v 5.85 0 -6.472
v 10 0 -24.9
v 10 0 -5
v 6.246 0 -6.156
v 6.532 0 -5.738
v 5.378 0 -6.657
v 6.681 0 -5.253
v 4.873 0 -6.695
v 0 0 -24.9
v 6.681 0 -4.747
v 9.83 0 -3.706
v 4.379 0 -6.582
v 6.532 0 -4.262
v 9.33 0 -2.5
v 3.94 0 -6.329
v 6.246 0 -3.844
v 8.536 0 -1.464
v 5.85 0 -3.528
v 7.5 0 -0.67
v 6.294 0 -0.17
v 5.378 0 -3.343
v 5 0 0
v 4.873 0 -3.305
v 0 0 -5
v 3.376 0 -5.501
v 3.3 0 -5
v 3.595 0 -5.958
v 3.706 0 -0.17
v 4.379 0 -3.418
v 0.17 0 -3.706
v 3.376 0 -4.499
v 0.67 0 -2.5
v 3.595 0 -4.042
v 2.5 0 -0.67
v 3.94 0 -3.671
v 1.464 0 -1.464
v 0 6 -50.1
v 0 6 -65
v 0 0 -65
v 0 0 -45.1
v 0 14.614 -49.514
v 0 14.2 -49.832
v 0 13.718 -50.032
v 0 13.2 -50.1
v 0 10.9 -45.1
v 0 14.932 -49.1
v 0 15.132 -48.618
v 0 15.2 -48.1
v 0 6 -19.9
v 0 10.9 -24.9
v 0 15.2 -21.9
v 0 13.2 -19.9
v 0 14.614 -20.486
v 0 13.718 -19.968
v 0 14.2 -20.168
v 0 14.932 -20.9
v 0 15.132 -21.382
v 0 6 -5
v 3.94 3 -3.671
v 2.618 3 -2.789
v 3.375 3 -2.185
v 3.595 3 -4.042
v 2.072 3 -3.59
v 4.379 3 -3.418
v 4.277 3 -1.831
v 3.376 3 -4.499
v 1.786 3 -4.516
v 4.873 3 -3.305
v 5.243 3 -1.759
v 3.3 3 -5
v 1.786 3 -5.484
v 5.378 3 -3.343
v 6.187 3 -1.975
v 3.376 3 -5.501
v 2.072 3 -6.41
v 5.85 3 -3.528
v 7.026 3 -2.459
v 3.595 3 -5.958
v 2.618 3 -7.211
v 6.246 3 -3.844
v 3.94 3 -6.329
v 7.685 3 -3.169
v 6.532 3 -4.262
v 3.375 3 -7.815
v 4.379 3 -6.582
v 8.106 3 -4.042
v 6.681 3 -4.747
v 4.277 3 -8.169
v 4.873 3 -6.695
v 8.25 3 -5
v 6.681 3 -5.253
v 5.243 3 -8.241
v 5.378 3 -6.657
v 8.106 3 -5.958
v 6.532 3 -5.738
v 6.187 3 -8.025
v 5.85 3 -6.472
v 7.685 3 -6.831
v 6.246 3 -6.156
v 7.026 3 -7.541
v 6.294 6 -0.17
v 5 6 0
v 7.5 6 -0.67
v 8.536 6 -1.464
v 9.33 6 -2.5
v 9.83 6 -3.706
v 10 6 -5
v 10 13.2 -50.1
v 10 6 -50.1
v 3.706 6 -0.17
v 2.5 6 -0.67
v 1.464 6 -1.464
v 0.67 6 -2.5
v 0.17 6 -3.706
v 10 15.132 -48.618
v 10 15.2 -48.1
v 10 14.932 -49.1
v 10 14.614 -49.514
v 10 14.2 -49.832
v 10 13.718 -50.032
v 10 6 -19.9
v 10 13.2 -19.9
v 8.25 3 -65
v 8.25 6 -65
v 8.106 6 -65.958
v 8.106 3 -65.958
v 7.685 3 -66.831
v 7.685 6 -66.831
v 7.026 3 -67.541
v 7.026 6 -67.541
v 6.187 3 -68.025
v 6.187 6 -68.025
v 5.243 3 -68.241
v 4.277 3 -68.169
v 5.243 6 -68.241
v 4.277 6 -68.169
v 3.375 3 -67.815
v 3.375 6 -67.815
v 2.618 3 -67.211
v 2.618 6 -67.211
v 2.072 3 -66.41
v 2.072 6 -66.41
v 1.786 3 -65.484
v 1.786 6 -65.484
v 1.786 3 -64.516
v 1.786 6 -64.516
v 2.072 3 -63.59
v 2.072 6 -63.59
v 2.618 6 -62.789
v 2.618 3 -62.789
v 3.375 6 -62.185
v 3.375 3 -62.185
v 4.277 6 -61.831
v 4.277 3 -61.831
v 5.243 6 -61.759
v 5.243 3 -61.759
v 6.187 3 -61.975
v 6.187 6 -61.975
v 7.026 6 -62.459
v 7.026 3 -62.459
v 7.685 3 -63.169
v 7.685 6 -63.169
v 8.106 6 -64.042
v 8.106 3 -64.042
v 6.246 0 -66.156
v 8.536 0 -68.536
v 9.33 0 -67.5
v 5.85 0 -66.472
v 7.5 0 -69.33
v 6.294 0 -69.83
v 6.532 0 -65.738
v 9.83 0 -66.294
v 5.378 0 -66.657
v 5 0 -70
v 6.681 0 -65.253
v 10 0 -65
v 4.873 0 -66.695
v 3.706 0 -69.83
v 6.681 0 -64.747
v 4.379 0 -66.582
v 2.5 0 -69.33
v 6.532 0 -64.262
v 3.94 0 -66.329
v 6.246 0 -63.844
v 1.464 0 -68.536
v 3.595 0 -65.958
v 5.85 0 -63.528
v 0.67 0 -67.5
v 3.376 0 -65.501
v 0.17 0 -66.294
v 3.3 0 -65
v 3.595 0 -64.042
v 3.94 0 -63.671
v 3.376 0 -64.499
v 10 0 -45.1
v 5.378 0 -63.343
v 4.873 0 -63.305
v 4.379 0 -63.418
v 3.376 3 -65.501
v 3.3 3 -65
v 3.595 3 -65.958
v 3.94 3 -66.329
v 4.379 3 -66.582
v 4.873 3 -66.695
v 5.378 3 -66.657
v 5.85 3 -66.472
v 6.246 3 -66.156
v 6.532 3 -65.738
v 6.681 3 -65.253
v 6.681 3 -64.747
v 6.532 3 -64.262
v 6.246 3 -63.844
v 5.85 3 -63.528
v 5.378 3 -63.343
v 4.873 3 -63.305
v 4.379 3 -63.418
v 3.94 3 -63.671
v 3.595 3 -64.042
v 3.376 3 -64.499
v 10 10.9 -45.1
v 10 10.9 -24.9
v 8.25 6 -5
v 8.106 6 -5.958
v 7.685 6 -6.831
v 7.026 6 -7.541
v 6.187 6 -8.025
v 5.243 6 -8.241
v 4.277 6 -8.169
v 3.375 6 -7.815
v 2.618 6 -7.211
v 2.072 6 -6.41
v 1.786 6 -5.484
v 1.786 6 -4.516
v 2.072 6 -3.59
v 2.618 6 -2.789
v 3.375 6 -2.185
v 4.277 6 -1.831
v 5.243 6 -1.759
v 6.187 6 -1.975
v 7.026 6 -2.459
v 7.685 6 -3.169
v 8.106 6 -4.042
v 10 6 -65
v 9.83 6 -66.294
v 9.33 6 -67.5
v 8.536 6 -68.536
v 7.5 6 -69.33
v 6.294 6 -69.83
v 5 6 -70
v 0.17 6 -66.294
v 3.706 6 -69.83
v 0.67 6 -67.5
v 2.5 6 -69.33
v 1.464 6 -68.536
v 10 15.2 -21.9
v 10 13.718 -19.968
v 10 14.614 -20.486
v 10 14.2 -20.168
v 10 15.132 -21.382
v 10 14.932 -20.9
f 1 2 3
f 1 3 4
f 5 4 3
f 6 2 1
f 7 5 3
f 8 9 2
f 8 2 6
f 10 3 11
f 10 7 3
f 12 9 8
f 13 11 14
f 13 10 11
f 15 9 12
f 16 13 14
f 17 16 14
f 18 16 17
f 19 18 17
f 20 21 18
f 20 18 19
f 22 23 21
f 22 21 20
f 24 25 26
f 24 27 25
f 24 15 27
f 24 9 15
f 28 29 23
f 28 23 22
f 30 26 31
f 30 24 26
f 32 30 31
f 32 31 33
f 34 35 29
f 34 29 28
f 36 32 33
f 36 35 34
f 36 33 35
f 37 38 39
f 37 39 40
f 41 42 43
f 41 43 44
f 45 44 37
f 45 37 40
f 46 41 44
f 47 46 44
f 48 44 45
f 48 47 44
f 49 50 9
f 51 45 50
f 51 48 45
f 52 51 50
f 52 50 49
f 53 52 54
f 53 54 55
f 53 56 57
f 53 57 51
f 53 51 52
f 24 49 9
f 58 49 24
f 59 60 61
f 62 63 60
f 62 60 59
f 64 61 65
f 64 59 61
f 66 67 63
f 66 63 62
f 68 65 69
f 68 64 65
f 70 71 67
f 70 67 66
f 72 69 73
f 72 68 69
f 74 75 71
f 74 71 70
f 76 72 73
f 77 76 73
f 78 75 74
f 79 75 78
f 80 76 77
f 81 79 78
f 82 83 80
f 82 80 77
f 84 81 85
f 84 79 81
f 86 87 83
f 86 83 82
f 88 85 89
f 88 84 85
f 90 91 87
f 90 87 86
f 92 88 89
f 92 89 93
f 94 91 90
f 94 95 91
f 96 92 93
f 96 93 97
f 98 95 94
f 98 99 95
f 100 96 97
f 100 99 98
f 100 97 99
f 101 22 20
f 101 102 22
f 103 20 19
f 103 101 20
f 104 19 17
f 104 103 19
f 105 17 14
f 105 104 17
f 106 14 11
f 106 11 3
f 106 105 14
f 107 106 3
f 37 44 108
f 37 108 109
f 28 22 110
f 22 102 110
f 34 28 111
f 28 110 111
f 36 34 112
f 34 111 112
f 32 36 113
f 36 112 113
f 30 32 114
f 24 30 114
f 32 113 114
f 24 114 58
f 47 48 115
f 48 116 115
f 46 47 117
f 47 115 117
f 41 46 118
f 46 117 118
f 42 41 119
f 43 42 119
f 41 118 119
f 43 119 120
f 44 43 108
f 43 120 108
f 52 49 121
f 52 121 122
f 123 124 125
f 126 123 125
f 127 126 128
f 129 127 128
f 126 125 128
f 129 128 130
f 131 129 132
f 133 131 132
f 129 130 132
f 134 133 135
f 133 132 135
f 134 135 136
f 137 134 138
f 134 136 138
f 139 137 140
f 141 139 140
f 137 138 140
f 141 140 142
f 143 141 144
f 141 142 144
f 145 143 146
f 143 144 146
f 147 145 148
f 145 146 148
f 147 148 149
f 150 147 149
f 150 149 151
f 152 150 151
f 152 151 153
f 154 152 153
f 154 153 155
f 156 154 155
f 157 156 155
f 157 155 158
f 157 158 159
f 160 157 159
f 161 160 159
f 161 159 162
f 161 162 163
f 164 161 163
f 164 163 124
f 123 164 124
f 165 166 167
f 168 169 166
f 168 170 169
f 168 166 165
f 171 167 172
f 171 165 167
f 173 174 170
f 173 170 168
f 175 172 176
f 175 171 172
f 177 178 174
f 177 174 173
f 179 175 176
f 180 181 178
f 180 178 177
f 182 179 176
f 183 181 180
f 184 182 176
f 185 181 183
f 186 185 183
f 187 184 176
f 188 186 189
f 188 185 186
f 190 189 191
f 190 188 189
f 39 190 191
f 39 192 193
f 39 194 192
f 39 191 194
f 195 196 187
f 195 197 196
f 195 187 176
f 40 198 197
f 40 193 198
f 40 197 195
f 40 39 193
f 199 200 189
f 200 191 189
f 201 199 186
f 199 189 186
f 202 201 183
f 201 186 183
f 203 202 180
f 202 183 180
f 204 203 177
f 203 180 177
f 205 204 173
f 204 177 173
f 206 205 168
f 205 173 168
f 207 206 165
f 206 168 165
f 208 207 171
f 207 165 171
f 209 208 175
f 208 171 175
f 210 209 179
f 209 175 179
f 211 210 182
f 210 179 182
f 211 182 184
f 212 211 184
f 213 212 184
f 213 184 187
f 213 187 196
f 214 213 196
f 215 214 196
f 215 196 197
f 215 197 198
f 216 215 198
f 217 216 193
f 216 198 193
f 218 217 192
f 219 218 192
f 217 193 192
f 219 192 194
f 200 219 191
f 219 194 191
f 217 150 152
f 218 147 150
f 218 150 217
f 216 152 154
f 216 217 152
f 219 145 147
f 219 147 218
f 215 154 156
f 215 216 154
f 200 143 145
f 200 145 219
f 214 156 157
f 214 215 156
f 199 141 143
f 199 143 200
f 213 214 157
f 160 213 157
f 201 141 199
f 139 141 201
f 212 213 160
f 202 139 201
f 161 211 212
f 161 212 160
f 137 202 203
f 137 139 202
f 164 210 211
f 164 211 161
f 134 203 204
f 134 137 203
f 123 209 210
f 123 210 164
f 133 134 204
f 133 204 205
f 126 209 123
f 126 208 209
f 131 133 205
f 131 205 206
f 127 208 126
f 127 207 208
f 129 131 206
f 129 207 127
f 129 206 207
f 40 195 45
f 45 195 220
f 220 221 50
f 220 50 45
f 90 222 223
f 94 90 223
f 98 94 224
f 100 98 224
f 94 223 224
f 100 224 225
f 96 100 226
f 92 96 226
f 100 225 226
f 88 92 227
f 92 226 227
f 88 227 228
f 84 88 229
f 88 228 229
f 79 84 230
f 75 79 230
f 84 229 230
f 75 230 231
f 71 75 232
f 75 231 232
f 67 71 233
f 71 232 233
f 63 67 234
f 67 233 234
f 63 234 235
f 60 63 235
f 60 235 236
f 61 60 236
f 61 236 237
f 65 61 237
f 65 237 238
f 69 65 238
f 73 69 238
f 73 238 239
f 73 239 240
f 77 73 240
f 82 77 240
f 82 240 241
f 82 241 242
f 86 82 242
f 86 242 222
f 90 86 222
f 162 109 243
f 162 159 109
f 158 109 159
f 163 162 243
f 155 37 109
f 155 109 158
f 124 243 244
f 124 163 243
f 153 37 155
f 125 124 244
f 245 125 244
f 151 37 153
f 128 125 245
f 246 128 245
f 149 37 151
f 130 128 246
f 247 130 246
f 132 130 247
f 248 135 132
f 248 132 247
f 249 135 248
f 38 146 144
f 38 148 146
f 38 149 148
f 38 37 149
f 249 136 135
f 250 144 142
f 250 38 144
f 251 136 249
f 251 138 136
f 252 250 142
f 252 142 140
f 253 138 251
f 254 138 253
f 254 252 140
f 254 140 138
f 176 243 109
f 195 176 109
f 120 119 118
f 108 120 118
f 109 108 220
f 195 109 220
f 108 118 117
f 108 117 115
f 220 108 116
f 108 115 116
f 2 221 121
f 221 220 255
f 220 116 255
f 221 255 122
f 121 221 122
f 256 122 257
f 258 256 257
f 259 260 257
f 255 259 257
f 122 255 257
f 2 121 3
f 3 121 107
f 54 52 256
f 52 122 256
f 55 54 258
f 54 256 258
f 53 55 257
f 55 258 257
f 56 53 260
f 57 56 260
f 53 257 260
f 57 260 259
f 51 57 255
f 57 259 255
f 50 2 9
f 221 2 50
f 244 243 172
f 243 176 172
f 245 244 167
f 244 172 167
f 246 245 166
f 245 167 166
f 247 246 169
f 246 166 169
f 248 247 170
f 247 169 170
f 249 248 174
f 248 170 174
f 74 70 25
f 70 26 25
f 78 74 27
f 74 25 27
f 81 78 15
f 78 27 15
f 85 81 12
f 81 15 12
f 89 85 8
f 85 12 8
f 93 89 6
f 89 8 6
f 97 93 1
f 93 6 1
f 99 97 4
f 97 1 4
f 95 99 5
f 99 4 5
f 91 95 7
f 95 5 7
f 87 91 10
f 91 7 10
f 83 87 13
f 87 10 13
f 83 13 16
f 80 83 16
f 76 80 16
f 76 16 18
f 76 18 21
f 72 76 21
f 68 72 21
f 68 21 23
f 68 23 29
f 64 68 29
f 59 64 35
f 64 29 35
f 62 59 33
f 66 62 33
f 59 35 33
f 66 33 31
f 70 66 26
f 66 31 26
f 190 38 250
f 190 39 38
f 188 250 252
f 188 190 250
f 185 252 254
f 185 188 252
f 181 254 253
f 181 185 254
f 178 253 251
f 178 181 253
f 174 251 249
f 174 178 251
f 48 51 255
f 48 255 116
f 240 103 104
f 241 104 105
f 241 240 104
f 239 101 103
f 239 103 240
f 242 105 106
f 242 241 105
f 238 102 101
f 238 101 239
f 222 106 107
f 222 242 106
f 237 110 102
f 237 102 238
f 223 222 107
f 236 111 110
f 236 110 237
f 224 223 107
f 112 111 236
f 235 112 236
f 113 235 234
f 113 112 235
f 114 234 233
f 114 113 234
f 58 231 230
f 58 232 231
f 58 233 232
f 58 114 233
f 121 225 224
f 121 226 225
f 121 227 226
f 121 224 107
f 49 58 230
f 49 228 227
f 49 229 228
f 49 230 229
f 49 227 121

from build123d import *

# Parameters (mm, degrees)
RESSALTO_EXTRUS_O1_DEPTH          = 10
REBAIXO_PARA_SHCS_M31_D           = 3.4
REBAIXO_PARA_SHCS_M31_CBORE_D     = 6.5
REBAIXO_PARA_SHCS_M31_CBORE_DEPTH = 3
ESBO_O5_W                         = 20.2
ESBO_O5_H                         = 10.9
CORTE_EXTRUS_O1_DEPTH             = 73.325928961
FILETE1_R                         = 5
FILETE2_R                         = 2


with BuildPart() as part:
    # Esboço1 → Ressalto-extrusão1 (new body)
    with BuildSketch(Plane(origin=(0, 0, 0), x_dir=(0, 0, -1), z_dir=(1, 0, 0))):
        Polygon((0, 0), (0, 6), (19.9, 6), (19.9, 15.2), (50.1, 15.2), (50.1, 6), (70, 6), (70, 0), align=None)
    extrude(amount=RESSALTO_EXTRUS_O1_DEPTH)

    # Rebaixo para SHCS M31 (through all)
    with Locations(Plane(origin=(0, 6, 0), x_dir=(1, 0, 0), z_dir=(0, 1, 0))):
        with Locations((5, 5), (5, 65)):
            CounterBoreHole(REBAIXO_PARA_SHCS_M31_D / 2, REBAIXO_PARA_SHCS_M31_CBORE_D / 2, REBAIXO_PARA_SHCS_M31_CBORE_DEPTH)

    # Esboço5 → Corte-extrusão1 (cut, through all)
    with BuildSketch(Plane(origin=(10, 0, 0), x_dir=(0, 0, -1), z_dir=(1, 0, 0))):
        with Locations((35, 5.45)):
            Rectangle(ESBO_O5_W, ESBO_O5_H)
    extrude(amount=-CORTE_EXTRUS_O1_DEPTH, mode=Mode.SUBTRACT)

    # Filete1
    filete1_edges = [part.edges().sort_by_distance(p)[0] for p in [
        (10, 3, 0),
        (0, 3, 0),
        (10, 3, -70),
        (0, 3, -70),
    ]]
    fillet(filete1_edges, radius=FILETE1_R - 0.0001)  # a hair under: the kernel refuses the full size

    # Filete2
    filete2_edges = [part.edges().sort_by_distance(p)[0] for p in [
        (5, 15.2, -19.9),
        (5, 15.2, -50.1),
    ]]
    fillet(filete2_edges, radius=FILETE2_R)


solid = part.part
